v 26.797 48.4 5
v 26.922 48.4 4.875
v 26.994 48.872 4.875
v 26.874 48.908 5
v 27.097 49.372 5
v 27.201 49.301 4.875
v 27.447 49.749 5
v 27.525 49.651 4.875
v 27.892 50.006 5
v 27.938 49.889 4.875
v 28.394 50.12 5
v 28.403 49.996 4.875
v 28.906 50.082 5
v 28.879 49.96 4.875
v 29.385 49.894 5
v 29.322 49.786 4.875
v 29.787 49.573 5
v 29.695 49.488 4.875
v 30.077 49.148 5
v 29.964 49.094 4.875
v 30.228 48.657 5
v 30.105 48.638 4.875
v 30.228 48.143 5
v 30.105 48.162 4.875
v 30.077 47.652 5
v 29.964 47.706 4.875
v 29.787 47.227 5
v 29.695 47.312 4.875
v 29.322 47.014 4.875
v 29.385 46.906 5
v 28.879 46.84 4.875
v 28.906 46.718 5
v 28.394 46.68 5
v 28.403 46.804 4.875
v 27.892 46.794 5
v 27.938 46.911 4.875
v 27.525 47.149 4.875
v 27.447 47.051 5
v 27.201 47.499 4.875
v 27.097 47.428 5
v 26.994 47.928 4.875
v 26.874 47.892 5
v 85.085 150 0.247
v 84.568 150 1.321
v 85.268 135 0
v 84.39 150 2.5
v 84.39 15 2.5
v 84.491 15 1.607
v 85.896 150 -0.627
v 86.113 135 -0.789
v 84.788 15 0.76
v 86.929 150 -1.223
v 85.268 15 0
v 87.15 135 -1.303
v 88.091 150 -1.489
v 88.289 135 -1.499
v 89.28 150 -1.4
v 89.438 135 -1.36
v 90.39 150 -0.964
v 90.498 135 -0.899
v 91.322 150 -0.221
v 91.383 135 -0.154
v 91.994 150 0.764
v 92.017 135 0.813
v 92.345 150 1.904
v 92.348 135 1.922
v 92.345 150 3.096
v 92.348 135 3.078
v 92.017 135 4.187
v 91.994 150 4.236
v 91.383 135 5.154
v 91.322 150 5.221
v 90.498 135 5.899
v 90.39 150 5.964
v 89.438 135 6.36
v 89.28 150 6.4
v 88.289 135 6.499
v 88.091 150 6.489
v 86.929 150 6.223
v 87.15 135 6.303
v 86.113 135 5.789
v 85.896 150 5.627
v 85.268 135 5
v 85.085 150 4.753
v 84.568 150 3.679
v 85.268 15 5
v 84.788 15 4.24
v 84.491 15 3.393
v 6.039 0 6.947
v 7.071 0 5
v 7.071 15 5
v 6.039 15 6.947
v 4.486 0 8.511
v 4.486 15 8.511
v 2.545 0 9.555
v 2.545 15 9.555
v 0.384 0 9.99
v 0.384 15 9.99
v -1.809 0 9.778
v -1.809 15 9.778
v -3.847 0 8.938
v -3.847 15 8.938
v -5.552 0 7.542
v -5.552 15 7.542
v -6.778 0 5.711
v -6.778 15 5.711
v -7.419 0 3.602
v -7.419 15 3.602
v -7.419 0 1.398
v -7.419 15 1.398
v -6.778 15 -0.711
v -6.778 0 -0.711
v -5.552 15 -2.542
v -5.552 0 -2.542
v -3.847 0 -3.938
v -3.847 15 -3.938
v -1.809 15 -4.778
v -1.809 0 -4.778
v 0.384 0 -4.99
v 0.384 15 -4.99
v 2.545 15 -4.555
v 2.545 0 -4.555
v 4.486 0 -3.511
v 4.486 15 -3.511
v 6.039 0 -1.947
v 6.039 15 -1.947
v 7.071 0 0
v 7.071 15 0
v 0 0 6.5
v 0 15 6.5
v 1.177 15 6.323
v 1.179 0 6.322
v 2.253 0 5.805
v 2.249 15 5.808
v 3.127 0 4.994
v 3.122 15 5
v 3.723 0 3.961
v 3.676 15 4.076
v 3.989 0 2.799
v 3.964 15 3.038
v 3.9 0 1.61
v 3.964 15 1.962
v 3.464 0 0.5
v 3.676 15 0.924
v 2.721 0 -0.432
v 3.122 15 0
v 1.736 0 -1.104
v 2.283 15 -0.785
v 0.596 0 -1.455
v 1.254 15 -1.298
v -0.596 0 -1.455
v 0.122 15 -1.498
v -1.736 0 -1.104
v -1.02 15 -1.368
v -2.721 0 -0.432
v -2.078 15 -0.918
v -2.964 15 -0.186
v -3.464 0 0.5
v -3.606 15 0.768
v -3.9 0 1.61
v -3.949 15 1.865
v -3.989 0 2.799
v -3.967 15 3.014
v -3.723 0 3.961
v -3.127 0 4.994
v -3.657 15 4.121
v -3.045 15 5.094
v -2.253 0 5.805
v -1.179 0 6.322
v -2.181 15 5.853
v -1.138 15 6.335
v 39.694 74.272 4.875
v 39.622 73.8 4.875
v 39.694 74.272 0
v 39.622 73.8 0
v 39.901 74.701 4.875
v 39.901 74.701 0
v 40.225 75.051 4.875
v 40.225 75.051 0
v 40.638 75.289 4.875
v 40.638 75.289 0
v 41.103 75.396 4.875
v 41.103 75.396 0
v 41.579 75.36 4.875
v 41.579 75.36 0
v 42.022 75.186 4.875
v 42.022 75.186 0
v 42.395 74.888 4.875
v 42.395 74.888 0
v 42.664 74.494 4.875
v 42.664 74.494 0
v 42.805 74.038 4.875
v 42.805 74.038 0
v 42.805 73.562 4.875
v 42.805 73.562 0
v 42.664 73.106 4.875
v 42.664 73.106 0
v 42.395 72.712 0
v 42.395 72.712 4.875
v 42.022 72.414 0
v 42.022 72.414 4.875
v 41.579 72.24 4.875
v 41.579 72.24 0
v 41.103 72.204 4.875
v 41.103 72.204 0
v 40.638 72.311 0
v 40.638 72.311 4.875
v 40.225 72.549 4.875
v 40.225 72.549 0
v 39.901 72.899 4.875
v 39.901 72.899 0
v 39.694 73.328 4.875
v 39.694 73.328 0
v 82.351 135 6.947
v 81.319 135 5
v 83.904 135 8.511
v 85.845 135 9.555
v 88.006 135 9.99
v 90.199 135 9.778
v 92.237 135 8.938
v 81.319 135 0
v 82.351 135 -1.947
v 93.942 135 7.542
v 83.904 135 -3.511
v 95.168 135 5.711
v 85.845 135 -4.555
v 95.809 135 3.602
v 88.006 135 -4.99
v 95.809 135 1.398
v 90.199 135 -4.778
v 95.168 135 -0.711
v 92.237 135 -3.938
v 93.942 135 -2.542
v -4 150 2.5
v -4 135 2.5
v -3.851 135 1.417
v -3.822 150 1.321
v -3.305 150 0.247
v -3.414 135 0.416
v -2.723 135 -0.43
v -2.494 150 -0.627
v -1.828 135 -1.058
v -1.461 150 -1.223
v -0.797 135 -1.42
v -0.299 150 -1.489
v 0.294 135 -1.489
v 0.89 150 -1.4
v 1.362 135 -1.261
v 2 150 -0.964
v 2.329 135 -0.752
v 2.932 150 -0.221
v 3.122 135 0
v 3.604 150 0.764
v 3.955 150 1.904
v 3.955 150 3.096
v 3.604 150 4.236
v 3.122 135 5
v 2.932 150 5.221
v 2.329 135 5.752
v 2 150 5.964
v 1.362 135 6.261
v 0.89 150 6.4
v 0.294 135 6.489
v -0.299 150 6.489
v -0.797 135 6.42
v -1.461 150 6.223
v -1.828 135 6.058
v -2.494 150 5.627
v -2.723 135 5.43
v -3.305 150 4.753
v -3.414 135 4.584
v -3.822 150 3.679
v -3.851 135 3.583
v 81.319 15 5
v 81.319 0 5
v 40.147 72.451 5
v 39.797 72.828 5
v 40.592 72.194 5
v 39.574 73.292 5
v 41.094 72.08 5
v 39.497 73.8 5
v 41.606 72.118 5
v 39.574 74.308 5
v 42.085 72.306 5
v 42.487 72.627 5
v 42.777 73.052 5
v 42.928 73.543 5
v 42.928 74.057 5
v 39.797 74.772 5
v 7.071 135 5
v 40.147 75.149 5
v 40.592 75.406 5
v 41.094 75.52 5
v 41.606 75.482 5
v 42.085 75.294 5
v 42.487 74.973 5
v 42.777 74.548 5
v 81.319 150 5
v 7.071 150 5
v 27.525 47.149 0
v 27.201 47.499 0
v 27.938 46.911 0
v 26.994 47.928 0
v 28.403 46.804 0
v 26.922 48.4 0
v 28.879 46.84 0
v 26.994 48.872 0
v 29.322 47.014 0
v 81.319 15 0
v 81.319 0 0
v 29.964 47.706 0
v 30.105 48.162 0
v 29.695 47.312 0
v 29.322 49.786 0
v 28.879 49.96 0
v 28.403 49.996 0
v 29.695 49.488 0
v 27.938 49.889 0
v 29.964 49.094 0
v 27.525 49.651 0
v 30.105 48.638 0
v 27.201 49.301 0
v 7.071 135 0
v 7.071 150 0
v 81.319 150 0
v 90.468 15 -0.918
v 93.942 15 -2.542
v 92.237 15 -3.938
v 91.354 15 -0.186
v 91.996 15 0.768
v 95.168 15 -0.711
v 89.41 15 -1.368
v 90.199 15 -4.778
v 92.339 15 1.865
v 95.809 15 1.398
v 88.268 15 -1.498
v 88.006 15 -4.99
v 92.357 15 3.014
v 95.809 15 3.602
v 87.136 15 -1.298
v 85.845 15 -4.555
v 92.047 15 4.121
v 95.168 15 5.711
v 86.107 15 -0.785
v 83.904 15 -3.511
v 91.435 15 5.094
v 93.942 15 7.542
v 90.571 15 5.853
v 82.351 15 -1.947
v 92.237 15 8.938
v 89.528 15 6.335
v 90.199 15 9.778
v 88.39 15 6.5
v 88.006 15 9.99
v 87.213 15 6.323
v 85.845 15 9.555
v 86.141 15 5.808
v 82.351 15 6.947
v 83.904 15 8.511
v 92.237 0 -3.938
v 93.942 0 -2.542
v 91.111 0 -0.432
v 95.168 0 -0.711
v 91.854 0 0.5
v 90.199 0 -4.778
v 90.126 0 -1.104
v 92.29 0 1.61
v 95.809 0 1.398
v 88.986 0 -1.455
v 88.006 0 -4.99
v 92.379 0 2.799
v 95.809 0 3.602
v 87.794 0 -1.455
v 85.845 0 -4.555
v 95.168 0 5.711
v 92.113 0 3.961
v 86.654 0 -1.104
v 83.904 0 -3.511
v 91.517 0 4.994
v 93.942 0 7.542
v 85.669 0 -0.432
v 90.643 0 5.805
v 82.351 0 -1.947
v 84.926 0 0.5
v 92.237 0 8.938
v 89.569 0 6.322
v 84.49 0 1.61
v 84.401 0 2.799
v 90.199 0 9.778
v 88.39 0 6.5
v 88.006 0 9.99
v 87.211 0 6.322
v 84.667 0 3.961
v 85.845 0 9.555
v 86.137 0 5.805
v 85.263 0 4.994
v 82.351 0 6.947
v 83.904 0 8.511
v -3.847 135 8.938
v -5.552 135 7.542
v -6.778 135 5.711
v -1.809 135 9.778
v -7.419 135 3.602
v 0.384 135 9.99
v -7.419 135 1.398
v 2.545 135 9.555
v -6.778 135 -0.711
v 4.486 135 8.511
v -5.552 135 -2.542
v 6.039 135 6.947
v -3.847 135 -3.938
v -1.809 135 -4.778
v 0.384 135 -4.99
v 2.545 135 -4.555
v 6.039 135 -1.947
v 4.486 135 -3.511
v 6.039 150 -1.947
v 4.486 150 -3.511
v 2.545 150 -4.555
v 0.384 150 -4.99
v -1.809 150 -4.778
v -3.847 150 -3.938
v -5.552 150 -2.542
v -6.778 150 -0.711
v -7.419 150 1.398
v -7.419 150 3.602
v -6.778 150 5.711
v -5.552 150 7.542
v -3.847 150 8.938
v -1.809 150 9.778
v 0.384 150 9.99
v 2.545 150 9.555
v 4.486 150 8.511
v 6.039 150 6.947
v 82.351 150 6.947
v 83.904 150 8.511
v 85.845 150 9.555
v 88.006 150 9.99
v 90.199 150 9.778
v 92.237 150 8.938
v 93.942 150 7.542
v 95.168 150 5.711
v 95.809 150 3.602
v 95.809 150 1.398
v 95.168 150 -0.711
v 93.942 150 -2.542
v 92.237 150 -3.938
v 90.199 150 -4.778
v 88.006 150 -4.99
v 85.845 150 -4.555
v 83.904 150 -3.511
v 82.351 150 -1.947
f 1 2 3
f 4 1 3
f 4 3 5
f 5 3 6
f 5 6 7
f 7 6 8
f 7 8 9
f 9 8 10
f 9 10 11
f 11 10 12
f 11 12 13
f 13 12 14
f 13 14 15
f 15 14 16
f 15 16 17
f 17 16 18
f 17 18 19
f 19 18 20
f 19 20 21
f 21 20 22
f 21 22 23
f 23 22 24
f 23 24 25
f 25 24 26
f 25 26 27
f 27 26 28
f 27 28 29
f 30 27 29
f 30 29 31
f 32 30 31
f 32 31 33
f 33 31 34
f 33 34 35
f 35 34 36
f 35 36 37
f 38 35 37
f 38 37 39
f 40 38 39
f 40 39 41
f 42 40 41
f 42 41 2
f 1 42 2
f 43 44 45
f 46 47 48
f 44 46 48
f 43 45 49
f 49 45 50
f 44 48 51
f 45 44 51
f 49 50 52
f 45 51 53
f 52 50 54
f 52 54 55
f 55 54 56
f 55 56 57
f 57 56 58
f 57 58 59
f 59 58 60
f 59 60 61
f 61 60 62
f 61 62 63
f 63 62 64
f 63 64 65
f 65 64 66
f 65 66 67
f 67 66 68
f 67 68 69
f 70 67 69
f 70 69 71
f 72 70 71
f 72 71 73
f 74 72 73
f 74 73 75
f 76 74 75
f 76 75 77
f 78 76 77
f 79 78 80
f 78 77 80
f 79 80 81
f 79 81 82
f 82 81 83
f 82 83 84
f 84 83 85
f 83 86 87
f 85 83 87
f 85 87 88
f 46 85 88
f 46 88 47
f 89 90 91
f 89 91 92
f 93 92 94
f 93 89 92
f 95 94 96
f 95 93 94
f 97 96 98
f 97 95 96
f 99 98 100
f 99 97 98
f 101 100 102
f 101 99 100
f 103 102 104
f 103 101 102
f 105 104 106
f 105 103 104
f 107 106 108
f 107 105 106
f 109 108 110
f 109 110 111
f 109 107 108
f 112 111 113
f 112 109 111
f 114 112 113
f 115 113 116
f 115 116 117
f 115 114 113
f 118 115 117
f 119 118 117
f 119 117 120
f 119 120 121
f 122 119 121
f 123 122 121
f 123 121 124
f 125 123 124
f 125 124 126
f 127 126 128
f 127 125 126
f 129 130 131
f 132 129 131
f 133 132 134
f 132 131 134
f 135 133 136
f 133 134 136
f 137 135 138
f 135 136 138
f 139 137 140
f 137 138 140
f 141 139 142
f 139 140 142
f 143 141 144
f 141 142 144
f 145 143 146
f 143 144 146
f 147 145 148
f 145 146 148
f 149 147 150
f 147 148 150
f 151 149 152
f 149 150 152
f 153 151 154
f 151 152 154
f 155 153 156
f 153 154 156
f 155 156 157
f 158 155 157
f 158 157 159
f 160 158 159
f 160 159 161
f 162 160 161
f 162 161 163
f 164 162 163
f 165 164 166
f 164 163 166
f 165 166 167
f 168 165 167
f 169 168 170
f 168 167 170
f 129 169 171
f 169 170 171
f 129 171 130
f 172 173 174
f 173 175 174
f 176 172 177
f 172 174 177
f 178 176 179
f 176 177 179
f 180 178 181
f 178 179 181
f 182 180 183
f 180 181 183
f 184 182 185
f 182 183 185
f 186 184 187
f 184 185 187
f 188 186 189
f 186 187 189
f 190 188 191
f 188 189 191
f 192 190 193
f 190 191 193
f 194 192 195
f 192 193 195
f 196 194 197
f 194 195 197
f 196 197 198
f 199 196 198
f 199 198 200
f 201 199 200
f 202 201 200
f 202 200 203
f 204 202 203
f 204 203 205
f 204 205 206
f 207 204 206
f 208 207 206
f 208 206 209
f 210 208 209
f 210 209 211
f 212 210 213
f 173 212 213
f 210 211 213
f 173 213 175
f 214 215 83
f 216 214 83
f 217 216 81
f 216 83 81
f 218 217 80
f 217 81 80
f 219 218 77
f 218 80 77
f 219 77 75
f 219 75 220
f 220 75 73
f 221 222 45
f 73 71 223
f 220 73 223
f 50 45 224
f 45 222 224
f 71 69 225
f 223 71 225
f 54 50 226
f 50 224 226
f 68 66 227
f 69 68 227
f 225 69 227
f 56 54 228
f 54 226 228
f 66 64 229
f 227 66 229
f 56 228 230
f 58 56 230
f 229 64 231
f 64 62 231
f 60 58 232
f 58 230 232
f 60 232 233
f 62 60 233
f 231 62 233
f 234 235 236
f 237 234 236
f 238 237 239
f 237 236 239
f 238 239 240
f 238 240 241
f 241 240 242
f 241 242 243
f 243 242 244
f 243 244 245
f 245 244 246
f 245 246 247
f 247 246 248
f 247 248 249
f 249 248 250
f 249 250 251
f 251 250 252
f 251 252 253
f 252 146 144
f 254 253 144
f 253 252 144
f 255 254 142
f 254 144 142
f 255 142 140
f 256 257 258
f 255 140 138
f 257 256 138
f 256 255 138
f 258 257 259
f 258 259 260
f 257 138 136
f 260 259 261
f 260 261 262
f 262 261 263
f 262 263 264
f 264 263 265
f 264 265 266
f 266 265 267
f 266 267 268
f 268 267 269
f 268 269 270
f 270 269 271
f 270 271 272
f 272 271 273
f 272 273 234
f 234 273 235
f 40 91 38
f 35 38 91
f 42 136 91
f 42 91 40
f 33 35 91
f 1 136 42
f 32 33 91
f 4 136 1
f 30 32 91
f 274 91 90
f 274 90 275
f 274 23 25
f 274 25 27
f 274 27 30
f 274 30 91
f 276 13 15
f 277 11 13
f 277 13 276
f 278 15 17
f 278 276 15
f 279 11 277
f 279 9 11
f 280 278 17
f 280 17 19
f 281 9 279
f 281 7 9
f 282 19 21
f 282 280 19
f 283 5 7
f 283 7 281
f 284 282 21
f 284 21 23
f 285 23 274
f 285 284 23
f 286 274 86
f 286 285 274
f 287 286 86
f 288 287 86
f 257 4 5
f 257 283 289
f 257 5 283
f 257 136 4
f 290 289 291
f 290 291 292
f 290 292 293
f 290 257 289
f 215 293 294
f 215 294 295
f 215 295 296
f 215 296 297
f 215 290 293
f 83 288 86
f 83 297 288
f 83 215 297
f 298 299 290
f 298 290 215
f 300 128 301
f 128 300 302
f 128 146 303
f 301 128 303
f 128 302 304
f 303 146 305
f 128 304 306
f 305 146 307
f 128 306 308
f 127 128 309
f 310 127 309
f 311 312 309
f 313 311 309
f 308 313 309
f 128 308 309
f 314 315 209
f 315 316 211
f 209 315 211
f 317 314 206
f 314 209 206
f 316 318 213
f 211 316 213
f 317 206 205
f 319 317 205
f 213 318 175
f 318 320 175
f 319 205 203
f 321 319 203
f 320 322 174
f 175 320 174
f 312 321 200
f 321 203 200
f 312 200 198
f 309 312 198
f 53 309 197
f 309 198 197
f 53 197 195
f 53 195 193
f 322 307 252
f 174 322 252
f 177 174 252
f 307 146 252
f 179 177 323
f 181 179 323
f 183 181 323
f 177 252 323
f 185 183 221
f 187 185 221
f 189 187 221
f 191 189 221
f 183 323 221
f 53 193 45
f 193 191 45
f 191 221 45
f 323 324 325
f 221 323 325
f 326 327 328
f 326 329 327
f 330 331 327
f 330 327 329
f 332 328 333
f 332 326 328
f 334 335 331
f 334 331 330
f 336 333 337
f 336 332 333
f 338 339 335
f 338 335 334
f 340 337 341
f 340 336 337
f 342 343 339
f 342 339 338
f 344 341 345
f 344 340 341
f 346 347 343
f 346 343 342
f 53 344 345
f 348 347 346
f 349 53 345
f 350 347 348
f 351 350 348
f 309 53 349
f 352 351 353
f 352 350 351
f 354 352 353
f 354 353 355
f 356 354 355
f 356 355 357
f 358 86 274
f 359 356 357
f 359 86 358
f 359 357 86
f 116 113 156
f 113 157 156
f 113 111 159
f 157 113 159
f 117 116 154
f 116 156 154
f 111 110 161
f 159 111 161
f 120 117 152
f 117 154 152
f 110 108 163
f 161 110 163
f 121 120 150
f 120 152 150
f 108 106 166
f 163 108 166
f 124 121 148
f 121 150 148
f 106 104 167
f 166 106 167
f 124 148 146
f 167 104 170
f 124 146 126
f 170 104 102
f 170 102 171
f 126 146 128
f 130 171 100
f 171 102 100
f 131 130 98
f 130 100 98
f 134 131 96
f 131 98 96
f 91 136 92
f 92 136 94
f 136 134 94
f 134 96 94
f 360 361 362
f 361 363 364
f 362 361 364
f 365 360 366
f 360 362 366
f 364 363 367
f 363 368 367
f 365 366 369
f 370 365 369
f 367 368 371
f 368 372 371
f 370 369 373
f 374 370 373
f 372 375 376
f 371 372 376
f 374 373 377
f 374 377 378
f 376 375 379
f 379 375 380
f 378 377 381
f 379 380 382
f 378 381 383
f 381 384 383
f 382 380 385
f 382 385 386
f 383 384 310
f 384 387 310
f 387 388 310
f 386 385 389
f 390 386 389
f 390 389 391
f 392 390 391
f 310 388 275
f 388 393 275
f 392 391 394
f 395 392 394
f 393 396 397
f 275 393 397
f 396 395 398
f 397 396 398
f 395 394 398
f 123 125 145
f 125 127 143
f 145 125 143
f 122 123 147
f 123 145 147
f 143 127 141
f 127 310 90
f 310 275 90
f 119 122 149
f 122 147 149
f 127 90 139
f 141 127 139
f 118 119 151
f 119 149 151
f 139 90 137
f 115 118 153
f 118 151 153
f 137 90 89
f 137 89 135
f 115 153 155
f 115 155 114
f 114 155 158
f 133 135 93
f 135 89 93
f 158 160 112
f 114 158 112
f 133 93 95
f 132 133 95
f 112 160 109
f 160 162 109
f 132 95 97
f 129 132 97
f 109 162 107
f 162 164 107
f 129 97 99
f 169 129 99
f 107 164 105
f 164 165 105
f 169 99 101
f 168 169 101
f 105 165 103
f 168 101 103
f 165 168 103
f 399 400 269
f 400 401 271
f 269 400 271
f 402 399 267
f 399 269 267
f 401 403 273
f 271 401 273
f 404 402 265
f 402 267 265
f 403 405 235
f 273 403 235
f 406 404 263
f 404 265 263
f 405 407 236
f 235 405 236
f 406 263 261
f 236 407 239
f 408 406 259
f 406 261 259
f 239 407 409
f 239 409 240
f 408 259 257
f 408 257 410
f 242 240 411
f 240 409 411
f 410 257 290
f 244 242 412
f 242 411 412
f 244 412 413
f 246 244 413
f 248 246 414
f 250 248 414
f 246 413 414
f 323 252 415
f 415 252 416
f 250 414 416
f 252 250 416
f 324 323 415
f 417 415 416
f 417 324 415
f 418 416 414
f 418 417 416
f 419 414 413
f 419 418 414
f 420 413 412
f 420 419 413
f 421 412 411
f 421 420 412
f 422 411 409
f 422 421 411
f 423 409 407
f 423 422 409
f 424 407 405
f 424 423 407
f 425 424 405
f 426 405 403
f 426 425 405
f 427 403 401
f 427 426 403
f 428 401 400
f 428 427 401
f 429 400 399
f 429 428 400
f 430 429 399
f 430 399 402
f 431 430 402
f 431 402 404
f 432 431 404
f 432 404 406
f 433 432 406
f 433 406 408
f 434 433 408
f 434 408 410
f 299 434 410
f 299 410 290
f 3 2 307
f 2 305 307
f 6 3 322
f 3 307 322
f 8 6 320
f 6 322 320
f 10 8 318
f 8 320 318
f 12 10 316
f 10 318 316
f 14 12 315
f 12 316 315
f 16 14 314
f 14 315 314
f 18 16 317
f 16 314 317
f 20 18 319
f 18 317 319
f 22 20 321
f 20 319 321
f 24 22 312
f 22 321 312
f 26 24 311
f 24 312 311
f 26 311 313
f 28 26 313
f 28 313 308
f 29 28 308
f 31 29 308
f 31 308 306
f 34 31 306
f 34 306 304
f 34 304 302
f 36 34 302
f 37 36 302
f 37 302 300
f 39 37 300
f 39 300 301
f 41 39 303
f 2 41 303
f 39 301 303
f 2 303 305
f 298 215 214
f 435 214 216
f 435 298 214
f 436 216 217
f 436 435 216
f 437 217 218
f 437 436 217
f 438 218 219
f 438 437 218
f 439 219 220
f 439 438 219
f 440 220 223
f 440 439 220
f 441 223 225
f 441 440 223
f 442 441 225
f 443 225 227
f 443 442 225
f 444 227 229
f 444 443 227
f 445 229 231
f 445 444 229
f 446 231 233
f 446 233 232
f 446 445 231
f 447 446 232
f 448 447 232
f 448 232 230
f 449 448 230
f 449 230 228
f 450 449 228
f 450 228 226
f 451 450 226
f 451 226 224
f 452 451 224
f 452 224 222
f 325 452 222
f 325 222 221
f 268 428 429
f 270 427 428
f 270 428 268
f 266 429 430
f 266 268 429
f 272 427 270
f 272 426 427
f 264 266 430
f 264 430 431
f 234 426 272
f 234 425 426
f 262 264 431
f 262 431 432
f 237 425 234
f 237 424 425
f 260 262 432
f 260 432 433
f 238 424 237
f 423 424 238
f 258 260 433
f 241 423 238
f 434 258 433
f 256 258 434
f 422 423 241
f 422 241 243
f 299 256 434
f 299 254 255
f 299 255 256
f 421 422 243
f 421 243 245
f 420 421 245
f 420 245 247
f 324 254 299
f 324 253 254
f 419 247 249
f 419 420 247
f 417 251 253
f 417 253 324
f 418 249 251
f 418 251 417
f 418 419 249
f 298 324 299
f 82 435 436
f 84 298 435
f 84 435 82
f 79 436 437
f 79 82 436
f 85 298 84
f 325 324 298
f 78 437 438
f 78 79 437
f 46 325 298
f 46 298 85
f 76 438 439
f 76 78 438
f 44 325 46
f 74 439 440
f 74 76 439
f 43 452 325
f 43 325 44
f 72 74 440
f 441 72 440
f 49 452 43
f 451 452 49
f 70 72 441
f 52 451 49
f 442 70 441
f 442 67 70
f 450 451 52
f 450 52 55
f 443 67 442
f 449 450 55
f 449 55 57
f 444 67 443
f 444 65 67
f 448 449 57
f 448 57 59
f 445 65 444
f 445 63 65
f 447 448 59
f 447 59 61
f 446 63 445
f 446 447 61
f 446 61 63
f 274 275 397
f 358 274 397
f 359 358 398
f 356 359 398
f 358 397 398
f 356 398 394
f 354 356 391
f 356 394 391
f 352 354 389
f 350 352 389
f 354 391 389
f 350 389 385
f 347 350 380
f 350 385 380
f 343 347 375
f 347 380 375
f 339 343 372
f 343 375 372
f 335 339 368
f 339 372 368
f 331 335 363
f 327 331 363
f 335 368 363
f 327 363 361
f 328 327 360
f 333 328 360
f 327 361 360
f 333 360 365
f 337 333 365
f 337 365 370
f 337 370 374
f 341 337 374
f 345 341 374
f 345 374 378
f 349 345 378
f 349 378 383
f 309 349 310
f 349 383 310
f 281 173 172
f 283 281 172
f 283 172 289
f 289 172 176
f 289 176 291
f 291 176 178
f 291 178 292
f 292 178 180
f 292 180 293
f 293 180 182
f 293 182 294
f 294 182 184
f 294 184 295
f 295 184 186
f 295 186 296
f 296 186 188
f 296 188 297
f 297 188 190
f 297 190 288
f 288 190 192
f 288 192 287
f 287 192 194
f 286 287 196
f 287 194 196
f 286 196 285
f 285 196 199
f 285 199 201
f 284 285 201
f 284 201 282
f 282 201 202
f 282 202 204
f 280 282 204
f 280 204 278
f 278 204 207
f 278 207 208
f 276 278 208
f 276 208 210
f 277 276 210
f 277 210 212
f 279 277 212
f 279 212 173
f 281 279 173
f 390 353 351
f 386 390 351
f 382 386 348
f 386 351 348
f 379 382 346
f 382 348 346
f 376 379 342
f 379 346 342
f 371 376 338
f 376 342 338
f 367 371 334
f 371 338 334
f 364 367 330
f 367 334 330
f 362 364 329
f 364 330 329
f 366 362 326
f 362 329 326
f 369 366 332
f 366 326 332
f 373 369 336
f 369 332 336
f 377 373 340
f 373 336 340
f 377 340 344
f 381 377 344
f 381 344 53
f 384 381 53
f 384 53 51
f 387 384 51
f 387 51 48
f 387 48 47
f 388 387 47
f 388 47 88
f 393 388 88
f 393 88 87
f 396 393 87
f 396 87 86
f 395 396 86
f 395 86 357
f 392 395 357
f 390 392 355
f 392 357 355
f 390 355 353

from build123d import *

# Parameters (mm, degrees)
SKETCH_1_W                   = 88.39
SKETCH_1_H                   = 150
EXTRUDE_1_DEPTH              = 5
SKETCH_2_R                   = 7.5
EXTRUDE_2_DEPTH              = 15
HOLE_WIZARD_1_D              = 8
EXTRUDE_3_DEPTH              = 15
SKETCH_8_R                   = 4
CUT_EXTRUDE_1_DEPTH          = 166.891205614
HOLE_WIZARD_M3_1_D           = 3.2
HOLE_WIZARD_M3_1_CSINK_D     = 3.45
HOLE_WIZARD_M3_1_CSINK_ANGLE = 90


with BuildPart() as part:
    # 스케치1 → 보스-돌출1 (new body)
    with BuildSketch(Plane.XY):
        with Locations((44.195, 75)):
            Rectangle(SKETCH_1_W, SKETCH_1_H)
    extrude(amount=EXTRUDE_1_DEPTH)

    # 스케치2 → 보스-돌출2 (add)
    with BuildSketch(Plane(origin=(0, 150, 0), x_dir=(1, 0, 0), z_dir=(0, 1, 0))):
        with Locations((88.39, -2.5)):
            Circle(SKETCH_2_R)
        with Locations((0, -2.5)):
            Circle(SKETCH_2_R)
    extrude(amount=-EXTRUDE_2_DEPTH)

    # 구멍1 (through all)
    with Locations(Plane(origin=(0, 150, 0), x_dir=(1, 0, 0), z_dir=(0, 1, 0))):
        with Locations((0, -2.5), (88.39, -2.5)):
            Hole(HOLE_WIZARD_1_D / 2)

    # 스케치7 → 보스-돌출3 (add)
    with BuildSketch(Plane.XZ):
        with BuildLine():
            Line((81.318932188, 0), (85.267501001, 0))
            ThreePointArc((85.267501001, 0), (84.39, 2.5), (85.267501001, 5))
            Line((85.267501001, 5), (81.318932188, 5))
            ThreePointArc((81.318932188, 5), (95.89, 2.5), (81.318932188, 0))
        make_face()
        with BuildLine():
            Line((3.122498999, 5), (7.071067812, 5))
            ThreePointArc((7.071067812, 5), (-7.5, 2.5), (7.071067812, 0))
            Line((7.071067812, 0), (3.122498999, 0))
            ThreePointArc((3.122498999, 0), (4, 2.5), (3.122498999, 5))
        make_face()
    extrude(amount=-EXTRUDE_3_DEPTH)

    # 스케치8 → 컷-돌출1 (cut, through all)
    with BuildSketch(Plane(origin=(0, 15, 0), x_dir=(1, 0, 0), z_dir=(0, 1, 0))):
        with Locations(Location((0, -2.5, 0), (0, 0, 270))):
            Circle(SKETCH_8_R)
        with Locations(Location((88.39, -2.5, 0), (0, 0, 270))):
            Circle(SKETCH_8_R)
    extrude(amount=-CUT_EXTRUDE_1_DEPTH, mode=Mode.SUBTRACT)

    # M3 여유 구멍1 (through all)
    with Locations(Plane.XY.offset(5)):
        with Locations((41.222498999, 73.8), (28.522498999, 48.4)):
            CounterSinkHole(HOLE_WIZARD_M3_1_D / 2, HOLE_WIZARD_M3_1_CSINK_D / 2, counter_sink_angle=HOLE_WIZARD_M3_1_CSINK_ANGLE)


solid = part.part
